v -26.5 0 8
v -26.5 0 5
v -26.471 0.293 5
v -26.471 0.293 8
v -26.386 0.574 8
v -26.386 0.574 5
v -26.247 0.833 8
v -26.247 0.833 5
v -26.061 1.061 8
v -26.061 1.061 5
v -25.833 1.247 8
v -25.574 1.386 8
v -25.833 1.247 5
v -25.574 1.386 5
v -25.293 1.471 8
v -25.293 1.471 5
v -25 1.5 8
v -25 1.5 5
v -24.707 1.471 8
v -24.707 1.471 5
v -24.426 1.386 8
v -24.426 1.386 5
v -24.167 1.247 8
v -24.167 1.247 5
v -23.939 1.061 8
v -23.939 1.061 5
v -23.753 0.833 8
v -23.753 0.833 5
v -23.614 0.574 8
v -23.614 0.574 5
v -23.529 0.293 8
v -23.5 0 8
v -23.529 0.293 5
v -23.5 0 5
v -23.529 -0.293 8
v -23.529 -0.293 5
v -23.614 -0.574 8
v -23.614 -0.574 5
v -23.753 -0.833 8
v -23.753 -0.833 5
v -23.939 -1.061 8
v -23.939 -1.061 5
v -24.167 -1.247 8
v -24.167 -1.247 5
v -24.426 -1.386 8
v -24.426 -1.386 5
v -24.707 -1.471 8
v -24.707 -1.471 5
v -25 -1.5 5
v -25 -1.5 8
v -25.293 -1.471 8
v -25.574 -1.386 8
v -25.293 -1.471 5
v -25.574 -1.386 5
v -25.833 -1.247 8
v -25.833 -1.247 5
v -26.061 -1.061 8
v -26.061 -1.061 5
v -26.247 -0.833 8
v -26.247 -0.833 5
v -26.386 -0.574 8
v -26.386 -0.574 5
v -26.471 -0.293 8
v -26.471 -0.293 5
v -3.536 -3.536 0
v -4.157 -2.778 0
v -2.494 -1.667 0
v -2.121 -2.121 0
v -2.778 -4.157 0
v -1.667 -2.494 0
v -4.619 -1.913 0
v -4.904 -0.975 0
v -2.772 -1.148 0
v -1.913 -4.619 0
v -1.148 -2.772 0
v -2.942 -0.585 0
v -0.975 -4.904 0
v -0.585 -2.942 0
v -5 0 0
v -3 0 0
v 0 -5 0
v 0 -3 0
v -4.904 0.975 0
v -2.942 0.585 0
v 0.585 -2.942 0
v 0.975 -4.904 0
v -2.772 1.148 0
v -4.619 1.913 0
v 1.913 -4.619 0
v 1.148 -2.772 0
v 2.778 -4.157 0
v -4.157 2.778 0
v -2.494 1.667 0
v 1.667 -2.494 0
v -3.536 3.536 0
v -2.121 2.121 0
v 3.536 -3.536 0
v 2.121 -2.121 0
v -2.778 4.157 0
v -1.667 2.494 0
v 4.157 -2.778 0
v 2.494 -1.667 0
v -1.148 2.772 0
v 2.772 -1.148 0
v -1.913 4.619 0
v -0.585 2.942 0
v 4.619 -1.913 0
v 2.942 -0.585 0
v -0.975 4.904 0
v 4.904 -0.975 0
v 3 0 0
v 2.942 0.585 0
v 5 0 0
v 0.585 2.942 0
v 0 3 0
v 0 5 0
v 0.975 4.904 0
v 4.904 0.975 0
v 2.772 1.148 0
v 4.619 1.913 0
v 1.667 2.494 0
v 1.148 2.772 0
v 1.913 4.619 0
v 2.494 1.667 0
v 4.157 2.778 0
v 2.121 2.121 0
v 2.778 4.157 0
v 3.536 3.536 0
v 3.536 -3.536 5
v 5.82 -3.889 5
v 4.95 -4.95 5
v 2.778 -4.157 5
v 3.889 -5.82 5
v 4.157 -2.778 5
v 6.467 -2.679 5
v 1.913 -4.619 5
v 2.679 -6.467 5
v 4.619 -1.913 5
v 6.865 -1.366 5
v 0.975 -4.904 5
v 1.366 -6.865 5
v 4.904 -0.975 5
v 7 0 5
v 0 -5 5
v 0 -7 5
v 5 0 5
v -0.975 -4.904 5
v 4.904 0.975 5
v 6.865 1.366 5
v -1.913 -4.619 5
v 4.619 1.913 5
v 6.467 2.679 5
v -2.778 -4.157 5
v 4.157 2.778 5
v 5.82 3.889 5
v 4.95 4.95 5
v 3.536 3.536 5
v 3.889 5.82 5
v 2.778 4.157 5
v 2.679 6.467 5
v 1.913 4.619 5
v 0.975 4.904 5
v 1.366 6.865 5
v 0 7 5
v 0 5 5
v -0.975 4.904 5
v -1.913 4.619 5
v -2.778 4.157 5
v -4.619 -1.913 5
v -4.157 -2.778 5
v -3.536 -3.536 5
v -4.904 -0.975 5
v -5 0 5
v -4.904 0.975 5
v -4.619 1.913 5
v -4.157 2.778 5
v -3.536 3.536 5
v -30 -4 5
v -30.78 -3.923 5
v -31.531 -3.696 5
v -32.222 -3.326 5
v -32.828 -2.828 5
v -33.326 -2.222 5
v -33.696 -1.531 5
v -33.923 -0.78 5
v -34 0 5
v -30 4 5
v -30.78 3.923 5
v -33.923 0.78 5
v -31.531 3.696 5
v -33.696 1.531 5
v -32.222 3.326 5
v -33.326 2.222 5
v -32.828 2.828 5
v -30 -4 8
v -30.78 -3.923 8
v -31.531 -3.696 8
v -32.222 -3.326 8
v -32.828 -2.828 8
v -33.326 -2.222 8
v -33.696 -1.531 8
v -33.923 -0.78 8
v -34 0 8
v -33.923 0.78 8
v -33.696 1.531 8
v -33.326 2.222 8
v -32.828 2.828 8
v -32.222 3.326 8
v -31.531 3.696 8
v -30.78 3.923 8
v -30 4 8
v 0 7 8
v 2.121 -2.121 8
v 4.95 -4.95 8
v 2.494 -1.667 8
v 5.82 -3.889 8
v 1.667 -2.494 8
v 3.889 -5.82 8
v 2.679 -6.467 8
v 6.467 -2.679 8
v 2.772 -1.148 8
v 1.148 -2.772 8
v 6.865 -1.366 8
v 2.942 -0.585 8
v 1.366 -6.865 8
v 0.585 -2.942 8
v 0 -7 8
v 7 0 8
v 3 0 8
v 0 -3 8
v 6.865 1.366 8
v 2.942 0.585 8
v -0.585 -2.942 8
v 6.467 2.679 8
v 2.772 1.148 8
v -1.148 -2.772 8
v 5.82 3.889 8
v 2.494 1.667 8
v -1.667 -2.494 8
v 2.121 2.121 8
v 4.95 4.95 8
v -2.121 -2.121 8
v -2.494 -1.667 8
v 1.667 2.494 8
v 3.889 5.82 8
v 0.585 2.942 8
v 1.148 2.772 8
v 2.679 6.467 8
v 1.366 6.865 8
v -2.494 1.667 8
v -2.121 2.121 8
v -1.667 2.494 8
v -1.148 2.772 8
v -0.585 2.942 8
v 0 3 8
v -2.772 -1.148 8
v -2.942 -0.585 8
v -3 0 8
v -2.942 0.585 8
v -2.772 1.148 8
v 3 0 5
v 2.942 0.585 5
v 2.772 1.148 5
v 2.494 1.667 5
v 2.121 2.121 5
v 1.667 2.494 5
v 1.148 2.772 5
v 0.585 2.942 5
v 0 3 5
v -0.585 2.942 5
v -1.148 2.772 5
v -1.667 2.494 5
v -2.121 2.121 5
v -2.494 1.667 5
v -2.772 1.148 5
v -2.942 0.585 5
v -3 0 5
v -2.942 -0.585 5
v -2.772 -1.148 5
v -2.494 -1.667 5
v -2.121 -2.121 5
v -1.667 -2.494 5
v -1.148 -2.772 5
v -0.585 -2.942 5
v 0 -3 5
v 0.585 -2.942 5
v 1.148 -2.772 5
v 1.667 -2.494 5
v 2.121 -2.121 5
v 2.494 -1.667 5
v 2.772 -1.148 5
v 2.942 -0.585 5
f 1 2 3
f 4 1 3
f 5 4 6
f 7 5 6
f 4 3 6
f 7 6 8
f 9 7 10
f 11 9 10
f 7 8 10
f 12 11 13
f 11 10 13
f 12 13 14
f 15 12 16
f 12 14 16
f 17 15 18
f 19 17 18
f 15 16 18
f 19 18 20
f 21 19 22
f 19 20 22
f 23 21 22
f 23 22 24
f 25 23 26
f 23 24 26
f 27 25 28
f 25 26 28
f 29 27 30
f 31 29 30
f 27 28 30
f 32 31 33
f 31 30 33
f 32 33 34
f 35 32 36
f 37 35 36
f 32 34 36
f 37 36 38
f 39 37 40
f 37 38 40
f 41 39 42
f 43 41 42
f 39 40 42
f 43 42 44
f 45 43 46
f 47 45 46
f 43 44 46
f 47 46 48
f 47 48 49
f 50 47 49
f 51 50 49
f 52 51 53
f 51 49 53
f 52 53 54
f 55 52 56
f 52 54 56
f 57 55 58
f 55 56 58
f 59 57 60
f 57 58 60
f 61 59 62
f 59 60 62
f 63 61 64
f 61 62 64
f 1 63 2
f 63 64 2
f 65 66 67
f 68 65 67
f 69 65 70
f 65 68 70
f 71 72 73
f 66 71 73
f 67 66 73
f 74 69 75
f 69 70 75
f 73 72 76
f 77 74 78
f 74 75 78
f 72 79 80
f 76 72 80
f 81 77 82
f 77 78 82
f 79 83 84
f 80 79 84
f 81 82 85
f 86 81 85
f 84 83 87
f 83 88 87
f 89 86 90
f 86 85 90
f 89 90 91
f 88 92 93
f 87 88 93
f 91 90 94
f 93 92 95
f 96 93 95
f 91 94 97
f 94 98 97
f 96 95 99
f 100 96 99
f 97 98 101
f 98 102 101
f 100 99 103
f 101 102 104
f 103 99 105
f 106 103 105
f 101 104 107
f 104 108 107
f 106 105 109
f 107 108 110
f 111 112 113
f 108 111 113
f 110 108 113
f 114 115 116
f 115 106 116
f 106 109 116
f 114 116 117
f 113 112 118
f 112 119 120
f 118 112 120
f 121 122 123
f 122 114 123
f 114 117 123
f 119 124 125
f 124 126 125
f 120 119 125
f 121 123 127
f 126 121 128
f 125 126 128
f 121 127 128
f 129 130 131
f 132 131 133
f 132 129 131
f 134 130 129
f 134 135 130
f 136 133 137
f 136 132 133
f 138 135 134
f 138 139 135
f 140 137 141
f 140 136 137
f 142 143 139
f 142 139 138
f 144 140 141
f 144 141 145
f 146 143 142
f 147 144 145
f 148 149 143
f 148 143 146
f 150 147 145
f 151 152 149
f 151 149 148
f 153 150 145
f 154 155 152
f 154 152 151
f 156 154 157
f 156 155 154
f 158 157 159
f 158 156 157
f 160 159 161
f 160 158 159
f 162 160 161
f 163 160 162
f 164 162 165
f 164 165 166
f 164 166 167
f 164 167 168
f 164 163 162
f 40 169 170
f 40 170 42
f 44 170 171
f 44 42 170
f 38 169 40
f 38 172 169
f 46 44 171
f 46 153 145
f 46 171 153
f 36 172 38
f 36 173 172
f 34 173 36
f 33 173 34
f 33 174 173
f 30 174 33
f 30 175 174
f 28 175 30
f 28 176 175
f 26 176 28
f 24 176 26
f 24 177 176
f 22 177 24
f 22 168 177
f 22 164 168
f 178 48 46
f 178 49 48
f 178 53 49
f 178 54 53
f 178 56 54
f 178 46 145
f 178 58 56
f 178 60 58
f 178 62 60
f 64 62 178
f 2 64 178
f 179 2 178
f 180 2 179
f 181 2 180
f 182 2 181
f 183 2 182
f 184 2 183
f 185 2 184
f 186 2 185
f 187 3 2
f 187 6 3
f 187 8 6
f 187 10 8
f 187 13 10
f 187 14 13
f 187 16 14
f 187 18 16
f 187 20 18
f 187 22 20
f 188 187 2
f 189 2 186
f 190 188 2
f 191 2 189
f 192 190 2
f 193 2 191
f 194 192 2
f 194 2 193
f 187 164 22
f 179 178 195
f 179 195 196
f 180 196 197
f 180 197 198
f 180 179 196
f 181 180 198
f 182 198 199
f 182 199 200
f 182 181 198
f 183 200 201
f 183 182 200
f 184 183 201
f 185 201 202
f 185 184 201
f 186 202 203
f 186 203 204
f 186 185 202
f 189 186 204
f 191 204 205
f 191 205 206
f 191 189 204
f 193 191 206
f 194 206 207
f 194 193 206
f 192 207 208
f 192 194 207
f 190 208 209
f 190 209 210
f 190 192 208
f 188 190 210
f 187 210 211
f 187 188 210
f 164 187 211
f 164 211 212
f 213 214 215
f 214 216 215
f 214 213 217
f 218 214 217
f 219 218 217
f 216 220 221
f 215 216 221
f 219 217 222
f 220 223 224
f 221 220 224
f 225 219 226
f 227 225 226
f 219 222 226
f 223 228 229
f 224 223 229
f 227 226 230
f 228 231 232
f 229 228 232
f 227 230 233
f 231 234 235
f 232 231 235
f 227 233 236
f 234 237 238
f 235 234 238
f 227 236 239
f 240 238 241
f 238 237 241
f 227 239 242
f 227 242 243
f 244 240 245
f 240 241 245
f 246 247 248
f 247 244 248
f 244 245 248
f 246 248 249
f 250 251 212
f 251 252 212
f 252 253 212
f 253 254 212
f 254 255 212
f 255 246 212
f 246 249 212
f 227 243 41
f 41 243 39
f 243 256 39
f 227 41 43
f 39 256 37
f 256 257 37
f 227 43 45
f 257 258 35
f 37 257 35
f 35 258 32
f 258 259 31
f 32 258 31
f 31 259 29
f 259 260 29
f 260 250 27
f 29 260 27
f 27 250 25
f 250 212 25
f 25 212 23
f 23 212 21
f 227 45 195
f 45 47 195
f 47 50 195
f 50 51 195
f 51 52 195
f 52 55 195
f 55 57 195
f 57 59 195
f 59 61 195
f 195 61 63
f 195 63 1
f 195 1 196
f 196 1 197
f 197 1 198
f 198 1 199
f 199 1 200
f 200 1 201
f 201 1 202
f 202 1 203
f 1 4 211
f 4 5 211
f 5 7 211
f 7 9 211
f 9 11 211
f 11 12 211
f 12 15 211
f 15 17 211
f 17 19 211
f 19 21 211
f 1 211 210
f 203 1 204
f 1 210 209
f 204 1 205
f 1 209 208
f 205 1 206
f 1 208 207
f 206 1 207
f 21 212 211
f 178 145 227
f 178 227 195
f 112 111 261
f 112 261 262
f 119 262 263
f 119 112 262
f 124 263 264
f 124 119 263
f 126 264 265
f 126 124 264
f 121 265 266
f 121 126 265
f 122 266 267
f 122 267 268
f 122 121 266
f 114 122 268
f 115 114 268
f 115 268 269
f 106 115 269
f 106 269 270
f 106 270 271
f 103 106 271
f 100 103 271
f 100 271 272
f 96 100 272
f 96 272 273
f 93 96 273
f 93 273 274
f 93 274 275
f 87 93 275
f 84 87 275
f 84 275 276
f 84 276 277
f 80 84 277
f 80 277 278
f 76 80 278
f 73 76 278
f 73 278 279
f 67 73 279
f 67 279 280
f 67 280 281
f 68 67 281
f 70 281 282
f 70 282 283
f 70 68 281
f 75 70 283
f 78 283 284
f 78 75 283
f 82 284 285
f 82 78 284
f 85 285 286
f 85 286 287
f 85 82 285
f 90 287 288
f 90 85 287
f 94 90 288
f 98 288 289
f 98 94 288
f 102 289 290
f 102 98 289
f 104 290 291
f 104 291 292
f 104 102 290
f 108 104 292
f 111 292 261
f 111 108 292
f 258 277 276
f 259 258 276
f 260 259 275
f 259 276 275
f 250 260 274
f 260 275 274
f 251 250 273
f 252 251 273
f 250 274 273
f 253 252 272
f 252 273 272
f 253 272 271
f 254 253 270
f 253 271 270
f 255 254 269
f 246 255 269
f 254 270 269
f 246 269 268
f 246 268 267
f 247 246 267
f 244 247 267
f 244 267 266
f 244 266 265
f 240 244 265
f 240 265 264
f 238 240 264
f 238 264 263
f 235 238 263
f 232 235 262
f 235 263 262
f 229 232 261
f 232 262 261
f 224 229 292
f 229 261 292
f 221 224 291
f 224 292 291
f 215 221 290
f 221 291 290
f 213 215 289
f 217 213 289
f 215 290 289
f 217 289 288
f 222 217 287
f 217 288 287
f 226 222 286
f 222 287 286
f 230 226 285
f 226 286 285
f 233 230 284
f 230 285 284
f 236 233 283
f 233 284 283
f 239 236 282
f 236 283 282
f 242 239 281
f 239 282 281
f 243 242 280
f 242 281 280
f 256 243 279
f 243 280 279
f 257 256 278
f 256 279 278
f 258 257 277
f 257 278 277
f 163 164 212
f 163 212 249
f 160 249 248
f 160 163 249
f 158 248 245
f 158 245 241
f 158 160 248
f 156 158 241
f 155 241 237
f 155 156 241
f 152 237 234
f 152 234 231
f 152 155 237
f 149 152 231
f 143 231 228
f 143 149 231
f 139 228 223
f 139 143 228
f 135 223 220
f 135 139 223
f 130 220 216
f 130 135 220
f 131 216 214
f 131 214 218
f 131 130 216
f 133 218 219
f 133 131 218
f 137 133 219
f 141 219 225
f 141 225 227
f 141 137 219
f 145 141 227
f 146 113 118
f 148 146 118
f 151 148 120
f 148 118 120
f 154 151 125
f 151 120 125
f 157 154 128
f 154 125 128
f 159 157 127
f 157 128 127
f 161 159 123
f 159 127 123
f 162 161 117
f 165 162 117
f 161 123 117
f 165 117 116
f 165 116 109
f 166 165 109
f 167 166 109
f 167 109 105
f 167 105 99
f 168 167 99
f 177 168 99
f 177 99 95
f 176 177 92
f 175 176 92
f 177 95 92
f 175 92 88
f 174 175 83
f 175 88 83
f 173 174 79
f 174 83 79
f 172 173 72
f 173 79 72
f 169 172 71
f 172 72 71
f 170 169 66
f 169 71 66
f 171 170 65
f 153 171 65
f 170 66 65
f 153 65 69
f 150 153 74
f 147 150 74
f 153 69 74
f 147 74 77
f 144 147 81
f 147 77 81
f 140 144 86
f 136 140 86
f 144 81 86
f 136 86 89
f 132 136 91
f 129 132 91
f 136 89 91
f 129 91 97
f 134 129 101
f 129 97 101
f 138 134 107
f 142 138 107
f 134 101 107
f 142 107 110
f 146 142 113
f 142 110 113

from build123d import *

# Parameters (mm, degrees)
SKETCH1_R           = 5
SKETCH1_R_2         = 3
BOSS_EXTRUDE1_DEPTH = 5
BOSS_EXTRUDE2_DEPTH = 3
SKETCH3_R           = 1.5
CUT_EXTRUDE1_DEPTH  = 3
SKETCH4_R           = 3
CUT_EXTRUDE2_DEPTH  = 3


with BuildPart() as part:
    # Sketch1 → Boss-Extrude1 (new body)
    with BuildSketch(Plane.XY):
        Circle(SKETCH1_R)
        Circle(SKETCH1_R_2, mode=Mode.SUBTRACT)
    extrude(amount=BOSS_EXTRUDE1_DEPTH)

    # Sketch2 → Boss-Extrude2 (add)
    with BuildSketch(Plane.XY.offset(5)):
        with BuildLine():
            Line((-30, 4), (0, 7))
            ThreePointArc((0, 7), (7, 0), (0, -7))
            Line((0, -7), (-30, -4))
            ThreePointArc((-30, -4), (-34, 0), (-30, 4))
        make_face()
    extrude(amount=BOSS_EXTRUDE2_DEPTH)

    # Sketch3 → Cut-Extrude1 (cut)
    with BuildSketch(Plane(origin=(0, 0, 5), x_dir=(-1, 0, 0), z_dir=(0, 0, -1))):
        with Locations((25, 0)):
            Circle(SKETCH3_R)
    extrude(amount=-CUT_EXTRUDE1_DEPTH, mode=Mode.SUBTRACT)

    # Sketch4 → Cut-Extrude2 (cut)
    with BuildSketch(Plane(origin=(0, 0, 5), x_dir=(-1, 0, 0), z_dir=(0, 0, -1))):
        Circle(SKETCH4_R)
    extrude(amount=-CUT_EXTRUDE2_DEPTH, mode=Mode.SUBTRACT)


solid = part.part
